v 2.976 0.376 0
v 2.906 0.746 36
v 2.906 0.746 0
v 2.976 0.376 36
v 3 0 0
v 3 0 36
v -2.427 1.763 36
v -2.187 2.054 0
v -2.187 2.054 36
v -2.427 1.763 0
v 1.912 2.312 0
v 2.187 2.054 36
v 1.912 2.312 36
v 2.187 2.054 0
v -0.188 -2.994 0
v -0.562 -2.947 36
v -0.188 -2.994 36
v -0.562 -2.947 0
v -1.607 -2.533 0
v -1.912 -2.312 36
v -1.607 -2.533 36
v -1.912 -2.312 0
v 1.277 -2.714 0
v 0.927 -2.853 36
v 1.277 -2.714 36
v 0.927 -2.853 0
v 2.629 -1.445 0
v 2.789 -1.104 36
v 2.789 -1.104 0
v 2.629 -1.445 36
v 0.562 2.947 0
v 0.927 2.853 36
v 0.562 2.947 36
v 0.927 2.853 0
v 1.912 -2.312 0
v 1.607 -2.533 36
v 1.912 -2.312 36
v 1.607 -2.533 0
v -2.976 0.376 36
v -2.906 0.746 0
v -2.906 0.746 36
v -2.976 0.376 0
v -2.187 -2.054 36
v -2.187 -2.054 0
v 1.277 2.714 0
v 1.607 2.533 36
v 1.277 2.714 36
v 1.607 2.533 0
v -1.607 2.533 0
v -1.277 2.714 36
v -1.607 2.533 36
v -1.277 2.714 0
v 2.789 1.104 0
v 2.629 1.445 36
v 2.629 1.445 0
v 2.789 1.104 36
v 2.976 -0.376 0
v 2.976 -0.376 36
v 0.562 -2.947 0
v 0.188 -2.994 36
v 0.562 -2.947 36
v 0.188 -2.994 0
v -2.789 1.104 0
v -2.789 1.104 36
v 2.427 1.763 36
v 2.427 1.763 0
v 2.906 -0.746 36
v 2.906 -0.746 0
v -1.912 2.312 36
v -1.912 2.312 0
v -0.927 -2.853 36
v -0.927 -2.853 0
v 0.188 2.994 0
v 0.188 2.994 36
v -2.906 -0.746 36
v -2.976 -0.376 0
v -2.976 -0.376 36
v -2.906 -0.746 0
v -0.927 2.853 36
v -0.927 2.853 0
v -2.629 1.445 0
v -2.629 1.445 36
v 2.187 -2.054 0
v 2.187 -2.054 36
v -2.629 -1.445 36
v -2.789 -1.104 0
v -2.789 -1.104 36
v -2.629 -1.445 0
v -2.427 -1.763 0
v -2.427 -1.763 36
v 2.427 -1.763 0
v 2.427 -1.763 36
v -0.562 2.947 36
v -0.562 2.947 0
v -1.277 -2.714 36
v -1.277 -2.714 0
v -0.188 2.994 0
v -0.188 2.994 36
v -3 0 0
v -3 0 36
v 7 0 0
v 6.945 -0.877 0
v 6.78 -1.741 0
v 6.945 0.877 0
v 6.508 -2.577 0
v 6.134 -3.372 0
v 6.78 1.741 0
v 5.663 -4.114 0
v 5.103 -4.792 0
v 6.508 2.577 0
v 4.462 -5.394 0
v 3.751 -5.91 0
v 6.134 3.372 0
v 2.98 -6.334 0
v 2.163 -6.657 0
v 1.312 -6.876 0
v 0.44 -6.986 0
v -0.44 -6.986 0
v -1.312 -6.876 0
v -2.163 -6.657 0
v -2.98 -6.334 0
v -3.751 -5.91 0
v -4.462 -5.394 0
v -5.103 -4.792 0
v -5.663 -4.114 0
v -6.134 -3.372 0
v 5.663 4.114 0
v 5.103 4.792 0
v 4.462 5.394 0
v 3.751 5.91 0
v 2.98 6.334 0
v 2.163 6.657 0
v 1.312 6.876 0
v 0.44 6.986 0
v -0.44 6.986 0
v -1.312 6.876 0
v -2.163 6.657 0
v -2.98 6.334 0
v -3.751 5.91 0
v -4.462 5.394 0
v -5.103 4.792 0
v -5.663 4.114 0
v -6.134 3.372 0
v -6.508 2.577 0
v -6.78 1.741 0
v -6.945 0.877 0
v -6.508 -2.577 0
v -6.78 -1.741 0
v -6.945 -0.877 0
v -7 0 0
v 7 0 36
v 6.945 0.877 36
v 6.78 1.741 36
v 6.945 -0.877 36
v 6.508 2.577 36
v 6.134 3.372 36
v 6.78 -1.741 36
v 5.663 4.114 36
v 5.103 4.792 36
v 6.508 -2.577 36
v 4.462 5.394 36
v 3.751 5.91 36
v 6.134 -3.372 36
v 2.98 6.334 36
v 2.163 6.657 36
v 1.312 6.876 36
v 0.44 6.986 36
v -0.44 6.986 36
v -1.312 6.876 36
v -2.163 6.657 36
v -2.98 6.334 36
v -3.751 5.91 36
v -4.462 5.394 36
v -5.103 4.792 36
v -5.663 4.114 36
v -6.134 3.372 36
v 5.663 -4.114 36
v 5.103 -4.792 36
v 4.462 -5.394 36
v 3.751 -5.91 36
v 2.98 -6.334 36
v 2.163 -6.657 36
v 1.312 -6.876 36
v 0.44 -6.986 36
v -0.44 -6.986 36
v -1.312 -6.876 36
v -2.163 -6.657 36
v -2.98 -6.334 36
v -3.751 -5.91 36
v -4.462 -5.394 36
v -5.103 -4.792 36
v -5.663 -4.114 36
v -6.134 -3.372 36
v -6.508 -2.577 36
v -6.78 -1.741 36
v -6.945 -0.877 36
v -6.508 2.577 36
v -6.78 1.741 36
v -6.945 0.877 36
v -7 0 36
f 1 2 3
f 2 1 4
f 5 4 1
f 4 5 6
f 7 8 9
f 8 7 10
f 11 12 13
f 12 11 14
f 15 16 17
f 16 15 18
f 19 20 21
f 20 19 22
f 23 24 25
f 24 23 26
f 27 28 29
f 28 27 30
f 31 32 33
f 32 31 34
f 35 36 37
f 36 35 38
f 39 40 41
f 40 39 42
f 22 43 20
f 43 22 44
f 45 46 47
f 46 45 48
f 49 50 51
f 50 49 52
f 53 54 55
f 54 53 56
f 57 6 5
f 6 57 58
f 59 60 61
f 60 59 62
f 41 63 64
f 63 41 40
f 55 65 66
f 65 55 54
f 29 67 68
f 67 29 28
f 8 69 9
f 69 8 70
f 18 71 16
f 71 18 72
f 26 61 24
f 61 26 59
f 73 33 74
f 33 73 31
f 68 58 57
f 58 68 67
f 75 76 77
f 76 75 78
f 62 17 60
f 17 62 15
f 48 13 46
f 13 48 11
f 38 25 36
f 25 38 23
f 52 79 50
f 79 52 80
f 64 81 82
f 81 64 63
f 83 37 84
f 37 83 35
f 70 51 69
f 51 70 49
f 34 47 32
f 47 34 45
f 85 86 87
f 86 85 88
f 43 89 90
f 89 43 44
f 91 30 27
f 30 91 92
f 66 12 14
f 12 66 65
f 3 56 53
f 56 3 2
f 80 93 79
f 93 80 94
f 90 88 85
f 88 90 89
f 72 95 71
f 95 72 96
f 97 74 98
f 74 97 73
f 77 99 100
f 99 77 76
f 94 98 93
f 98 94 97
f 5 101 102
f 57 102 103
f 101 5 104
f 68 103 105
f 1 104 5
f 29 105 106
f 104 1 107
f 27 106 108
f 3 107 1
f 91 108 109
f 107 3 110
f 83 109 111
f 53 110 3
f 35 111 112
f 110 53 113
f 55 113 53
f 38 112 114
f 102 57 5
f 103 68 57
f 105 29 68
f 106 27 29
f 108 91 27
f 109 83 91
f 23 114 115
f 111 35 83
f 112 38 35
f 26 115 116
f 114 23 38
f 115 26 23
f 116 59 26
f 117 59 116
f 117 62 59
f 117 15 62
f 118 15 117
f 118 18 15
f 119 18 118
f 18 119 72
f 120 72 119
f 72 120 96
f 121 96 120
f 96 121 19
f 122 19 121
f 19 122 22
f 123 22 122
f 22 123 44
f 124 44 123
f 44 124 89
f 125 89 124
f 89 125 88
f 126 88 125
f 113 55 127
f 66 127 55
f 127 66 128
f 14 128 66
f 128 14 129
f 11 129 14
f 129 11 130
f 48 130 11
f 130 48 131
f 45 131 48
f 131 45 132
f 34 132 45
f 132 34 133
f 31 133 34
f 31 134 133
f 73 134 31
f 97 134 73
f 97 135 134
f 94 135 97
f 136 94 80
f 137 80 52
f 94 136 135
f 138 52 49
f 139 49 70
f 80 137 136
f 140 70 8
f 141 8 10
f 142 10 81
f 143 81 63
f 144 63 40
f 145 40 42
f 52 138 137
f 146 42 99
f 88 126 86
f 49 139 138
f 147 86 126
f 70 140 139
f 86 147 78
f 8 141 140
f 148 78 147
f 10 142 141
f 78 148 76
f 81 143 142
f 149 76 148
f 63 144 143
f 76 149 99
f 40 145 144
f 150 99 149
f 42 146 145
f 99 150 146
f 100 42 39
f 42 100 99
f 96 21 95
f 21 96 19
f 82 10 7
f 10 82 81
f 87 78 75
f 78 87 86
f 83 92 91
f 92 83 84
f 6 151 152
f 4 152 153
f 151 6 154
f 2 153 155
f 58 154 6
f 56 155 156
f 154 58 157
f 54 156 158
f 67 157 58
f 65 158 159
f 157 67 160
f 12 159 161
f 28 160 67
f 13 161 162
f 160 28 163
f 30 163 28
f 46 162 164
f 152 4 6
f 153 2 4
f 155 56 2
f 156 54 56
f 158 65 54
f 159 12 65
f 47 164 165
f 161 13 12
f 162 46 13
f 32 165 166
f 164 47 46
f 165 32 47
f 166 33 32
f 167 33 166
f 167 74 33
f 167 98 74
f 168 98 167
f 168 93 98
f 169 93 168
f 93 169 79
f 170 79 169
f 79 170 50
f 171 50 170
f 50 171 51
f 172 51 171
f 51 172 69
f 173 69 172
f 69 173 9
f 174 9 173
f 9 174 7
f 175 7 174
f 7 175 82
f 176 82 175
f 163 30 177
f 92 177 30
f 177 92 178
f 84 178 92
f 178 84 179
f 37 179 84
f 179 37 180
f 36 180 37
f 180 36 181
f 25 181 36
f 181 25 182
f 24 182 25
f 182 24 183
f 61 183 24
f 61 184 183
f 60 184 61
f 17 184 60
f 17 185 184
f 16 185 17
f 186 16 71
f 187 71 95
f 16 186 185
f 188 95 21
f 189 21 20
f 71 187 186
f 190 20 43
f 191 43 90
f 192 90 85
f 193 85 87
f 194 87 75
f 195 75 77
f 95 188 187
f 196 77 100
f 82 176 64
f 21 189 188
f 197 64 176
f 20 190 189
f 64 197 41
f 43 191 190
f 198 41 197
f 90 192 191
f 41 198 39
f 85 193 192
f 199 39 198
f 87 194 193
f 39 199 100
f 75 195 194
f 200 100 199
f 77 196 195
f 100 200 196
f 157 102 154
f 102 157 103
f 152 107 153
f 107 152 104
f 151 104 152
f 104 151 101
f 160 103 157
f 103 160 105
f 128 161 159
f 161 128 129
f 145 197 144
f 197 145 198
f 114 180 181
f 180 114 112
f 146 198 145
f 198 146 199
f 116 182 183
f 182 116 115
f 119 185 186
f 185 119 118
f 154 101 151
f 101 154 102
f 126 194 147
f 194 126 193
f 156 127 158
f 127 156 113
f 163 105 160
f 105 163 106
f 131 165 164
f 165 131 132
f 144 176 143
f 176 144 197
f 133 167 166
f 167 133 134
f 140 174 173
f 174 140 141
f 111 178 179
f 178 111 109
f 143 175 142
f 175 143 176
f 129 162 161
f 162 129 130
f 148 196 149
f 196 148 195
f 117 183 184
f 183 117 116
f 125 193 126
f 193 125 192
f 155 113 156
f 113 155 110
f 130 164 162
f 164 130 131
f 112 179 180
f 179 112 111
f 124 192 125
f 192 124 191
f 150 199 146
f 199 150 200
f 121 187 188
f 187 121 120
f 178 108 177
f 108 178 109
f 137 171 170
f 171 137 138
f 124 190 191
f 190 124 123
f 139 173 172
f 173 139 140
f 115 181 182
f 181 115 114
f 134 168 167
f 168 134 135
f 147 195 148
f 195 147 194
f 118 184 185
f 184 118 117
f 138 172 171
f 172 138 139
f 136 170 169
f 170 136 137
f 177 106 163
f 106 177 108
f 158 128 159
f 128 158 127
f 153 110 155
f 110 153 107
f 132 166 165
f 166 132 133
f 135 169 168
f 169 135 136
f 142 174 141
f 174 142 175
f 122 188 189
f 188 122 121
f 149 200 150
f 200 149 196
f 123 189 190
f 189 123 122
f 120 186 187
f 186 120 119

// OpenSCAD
$fn = 50;

difference() {
	union() {
		cylinder(h = 36, r = 7.0);
	}
	union() {
		cylinder(h = 36, r = 3.0);
		cylinder(h = 36, r = 1.5);
	}
}
